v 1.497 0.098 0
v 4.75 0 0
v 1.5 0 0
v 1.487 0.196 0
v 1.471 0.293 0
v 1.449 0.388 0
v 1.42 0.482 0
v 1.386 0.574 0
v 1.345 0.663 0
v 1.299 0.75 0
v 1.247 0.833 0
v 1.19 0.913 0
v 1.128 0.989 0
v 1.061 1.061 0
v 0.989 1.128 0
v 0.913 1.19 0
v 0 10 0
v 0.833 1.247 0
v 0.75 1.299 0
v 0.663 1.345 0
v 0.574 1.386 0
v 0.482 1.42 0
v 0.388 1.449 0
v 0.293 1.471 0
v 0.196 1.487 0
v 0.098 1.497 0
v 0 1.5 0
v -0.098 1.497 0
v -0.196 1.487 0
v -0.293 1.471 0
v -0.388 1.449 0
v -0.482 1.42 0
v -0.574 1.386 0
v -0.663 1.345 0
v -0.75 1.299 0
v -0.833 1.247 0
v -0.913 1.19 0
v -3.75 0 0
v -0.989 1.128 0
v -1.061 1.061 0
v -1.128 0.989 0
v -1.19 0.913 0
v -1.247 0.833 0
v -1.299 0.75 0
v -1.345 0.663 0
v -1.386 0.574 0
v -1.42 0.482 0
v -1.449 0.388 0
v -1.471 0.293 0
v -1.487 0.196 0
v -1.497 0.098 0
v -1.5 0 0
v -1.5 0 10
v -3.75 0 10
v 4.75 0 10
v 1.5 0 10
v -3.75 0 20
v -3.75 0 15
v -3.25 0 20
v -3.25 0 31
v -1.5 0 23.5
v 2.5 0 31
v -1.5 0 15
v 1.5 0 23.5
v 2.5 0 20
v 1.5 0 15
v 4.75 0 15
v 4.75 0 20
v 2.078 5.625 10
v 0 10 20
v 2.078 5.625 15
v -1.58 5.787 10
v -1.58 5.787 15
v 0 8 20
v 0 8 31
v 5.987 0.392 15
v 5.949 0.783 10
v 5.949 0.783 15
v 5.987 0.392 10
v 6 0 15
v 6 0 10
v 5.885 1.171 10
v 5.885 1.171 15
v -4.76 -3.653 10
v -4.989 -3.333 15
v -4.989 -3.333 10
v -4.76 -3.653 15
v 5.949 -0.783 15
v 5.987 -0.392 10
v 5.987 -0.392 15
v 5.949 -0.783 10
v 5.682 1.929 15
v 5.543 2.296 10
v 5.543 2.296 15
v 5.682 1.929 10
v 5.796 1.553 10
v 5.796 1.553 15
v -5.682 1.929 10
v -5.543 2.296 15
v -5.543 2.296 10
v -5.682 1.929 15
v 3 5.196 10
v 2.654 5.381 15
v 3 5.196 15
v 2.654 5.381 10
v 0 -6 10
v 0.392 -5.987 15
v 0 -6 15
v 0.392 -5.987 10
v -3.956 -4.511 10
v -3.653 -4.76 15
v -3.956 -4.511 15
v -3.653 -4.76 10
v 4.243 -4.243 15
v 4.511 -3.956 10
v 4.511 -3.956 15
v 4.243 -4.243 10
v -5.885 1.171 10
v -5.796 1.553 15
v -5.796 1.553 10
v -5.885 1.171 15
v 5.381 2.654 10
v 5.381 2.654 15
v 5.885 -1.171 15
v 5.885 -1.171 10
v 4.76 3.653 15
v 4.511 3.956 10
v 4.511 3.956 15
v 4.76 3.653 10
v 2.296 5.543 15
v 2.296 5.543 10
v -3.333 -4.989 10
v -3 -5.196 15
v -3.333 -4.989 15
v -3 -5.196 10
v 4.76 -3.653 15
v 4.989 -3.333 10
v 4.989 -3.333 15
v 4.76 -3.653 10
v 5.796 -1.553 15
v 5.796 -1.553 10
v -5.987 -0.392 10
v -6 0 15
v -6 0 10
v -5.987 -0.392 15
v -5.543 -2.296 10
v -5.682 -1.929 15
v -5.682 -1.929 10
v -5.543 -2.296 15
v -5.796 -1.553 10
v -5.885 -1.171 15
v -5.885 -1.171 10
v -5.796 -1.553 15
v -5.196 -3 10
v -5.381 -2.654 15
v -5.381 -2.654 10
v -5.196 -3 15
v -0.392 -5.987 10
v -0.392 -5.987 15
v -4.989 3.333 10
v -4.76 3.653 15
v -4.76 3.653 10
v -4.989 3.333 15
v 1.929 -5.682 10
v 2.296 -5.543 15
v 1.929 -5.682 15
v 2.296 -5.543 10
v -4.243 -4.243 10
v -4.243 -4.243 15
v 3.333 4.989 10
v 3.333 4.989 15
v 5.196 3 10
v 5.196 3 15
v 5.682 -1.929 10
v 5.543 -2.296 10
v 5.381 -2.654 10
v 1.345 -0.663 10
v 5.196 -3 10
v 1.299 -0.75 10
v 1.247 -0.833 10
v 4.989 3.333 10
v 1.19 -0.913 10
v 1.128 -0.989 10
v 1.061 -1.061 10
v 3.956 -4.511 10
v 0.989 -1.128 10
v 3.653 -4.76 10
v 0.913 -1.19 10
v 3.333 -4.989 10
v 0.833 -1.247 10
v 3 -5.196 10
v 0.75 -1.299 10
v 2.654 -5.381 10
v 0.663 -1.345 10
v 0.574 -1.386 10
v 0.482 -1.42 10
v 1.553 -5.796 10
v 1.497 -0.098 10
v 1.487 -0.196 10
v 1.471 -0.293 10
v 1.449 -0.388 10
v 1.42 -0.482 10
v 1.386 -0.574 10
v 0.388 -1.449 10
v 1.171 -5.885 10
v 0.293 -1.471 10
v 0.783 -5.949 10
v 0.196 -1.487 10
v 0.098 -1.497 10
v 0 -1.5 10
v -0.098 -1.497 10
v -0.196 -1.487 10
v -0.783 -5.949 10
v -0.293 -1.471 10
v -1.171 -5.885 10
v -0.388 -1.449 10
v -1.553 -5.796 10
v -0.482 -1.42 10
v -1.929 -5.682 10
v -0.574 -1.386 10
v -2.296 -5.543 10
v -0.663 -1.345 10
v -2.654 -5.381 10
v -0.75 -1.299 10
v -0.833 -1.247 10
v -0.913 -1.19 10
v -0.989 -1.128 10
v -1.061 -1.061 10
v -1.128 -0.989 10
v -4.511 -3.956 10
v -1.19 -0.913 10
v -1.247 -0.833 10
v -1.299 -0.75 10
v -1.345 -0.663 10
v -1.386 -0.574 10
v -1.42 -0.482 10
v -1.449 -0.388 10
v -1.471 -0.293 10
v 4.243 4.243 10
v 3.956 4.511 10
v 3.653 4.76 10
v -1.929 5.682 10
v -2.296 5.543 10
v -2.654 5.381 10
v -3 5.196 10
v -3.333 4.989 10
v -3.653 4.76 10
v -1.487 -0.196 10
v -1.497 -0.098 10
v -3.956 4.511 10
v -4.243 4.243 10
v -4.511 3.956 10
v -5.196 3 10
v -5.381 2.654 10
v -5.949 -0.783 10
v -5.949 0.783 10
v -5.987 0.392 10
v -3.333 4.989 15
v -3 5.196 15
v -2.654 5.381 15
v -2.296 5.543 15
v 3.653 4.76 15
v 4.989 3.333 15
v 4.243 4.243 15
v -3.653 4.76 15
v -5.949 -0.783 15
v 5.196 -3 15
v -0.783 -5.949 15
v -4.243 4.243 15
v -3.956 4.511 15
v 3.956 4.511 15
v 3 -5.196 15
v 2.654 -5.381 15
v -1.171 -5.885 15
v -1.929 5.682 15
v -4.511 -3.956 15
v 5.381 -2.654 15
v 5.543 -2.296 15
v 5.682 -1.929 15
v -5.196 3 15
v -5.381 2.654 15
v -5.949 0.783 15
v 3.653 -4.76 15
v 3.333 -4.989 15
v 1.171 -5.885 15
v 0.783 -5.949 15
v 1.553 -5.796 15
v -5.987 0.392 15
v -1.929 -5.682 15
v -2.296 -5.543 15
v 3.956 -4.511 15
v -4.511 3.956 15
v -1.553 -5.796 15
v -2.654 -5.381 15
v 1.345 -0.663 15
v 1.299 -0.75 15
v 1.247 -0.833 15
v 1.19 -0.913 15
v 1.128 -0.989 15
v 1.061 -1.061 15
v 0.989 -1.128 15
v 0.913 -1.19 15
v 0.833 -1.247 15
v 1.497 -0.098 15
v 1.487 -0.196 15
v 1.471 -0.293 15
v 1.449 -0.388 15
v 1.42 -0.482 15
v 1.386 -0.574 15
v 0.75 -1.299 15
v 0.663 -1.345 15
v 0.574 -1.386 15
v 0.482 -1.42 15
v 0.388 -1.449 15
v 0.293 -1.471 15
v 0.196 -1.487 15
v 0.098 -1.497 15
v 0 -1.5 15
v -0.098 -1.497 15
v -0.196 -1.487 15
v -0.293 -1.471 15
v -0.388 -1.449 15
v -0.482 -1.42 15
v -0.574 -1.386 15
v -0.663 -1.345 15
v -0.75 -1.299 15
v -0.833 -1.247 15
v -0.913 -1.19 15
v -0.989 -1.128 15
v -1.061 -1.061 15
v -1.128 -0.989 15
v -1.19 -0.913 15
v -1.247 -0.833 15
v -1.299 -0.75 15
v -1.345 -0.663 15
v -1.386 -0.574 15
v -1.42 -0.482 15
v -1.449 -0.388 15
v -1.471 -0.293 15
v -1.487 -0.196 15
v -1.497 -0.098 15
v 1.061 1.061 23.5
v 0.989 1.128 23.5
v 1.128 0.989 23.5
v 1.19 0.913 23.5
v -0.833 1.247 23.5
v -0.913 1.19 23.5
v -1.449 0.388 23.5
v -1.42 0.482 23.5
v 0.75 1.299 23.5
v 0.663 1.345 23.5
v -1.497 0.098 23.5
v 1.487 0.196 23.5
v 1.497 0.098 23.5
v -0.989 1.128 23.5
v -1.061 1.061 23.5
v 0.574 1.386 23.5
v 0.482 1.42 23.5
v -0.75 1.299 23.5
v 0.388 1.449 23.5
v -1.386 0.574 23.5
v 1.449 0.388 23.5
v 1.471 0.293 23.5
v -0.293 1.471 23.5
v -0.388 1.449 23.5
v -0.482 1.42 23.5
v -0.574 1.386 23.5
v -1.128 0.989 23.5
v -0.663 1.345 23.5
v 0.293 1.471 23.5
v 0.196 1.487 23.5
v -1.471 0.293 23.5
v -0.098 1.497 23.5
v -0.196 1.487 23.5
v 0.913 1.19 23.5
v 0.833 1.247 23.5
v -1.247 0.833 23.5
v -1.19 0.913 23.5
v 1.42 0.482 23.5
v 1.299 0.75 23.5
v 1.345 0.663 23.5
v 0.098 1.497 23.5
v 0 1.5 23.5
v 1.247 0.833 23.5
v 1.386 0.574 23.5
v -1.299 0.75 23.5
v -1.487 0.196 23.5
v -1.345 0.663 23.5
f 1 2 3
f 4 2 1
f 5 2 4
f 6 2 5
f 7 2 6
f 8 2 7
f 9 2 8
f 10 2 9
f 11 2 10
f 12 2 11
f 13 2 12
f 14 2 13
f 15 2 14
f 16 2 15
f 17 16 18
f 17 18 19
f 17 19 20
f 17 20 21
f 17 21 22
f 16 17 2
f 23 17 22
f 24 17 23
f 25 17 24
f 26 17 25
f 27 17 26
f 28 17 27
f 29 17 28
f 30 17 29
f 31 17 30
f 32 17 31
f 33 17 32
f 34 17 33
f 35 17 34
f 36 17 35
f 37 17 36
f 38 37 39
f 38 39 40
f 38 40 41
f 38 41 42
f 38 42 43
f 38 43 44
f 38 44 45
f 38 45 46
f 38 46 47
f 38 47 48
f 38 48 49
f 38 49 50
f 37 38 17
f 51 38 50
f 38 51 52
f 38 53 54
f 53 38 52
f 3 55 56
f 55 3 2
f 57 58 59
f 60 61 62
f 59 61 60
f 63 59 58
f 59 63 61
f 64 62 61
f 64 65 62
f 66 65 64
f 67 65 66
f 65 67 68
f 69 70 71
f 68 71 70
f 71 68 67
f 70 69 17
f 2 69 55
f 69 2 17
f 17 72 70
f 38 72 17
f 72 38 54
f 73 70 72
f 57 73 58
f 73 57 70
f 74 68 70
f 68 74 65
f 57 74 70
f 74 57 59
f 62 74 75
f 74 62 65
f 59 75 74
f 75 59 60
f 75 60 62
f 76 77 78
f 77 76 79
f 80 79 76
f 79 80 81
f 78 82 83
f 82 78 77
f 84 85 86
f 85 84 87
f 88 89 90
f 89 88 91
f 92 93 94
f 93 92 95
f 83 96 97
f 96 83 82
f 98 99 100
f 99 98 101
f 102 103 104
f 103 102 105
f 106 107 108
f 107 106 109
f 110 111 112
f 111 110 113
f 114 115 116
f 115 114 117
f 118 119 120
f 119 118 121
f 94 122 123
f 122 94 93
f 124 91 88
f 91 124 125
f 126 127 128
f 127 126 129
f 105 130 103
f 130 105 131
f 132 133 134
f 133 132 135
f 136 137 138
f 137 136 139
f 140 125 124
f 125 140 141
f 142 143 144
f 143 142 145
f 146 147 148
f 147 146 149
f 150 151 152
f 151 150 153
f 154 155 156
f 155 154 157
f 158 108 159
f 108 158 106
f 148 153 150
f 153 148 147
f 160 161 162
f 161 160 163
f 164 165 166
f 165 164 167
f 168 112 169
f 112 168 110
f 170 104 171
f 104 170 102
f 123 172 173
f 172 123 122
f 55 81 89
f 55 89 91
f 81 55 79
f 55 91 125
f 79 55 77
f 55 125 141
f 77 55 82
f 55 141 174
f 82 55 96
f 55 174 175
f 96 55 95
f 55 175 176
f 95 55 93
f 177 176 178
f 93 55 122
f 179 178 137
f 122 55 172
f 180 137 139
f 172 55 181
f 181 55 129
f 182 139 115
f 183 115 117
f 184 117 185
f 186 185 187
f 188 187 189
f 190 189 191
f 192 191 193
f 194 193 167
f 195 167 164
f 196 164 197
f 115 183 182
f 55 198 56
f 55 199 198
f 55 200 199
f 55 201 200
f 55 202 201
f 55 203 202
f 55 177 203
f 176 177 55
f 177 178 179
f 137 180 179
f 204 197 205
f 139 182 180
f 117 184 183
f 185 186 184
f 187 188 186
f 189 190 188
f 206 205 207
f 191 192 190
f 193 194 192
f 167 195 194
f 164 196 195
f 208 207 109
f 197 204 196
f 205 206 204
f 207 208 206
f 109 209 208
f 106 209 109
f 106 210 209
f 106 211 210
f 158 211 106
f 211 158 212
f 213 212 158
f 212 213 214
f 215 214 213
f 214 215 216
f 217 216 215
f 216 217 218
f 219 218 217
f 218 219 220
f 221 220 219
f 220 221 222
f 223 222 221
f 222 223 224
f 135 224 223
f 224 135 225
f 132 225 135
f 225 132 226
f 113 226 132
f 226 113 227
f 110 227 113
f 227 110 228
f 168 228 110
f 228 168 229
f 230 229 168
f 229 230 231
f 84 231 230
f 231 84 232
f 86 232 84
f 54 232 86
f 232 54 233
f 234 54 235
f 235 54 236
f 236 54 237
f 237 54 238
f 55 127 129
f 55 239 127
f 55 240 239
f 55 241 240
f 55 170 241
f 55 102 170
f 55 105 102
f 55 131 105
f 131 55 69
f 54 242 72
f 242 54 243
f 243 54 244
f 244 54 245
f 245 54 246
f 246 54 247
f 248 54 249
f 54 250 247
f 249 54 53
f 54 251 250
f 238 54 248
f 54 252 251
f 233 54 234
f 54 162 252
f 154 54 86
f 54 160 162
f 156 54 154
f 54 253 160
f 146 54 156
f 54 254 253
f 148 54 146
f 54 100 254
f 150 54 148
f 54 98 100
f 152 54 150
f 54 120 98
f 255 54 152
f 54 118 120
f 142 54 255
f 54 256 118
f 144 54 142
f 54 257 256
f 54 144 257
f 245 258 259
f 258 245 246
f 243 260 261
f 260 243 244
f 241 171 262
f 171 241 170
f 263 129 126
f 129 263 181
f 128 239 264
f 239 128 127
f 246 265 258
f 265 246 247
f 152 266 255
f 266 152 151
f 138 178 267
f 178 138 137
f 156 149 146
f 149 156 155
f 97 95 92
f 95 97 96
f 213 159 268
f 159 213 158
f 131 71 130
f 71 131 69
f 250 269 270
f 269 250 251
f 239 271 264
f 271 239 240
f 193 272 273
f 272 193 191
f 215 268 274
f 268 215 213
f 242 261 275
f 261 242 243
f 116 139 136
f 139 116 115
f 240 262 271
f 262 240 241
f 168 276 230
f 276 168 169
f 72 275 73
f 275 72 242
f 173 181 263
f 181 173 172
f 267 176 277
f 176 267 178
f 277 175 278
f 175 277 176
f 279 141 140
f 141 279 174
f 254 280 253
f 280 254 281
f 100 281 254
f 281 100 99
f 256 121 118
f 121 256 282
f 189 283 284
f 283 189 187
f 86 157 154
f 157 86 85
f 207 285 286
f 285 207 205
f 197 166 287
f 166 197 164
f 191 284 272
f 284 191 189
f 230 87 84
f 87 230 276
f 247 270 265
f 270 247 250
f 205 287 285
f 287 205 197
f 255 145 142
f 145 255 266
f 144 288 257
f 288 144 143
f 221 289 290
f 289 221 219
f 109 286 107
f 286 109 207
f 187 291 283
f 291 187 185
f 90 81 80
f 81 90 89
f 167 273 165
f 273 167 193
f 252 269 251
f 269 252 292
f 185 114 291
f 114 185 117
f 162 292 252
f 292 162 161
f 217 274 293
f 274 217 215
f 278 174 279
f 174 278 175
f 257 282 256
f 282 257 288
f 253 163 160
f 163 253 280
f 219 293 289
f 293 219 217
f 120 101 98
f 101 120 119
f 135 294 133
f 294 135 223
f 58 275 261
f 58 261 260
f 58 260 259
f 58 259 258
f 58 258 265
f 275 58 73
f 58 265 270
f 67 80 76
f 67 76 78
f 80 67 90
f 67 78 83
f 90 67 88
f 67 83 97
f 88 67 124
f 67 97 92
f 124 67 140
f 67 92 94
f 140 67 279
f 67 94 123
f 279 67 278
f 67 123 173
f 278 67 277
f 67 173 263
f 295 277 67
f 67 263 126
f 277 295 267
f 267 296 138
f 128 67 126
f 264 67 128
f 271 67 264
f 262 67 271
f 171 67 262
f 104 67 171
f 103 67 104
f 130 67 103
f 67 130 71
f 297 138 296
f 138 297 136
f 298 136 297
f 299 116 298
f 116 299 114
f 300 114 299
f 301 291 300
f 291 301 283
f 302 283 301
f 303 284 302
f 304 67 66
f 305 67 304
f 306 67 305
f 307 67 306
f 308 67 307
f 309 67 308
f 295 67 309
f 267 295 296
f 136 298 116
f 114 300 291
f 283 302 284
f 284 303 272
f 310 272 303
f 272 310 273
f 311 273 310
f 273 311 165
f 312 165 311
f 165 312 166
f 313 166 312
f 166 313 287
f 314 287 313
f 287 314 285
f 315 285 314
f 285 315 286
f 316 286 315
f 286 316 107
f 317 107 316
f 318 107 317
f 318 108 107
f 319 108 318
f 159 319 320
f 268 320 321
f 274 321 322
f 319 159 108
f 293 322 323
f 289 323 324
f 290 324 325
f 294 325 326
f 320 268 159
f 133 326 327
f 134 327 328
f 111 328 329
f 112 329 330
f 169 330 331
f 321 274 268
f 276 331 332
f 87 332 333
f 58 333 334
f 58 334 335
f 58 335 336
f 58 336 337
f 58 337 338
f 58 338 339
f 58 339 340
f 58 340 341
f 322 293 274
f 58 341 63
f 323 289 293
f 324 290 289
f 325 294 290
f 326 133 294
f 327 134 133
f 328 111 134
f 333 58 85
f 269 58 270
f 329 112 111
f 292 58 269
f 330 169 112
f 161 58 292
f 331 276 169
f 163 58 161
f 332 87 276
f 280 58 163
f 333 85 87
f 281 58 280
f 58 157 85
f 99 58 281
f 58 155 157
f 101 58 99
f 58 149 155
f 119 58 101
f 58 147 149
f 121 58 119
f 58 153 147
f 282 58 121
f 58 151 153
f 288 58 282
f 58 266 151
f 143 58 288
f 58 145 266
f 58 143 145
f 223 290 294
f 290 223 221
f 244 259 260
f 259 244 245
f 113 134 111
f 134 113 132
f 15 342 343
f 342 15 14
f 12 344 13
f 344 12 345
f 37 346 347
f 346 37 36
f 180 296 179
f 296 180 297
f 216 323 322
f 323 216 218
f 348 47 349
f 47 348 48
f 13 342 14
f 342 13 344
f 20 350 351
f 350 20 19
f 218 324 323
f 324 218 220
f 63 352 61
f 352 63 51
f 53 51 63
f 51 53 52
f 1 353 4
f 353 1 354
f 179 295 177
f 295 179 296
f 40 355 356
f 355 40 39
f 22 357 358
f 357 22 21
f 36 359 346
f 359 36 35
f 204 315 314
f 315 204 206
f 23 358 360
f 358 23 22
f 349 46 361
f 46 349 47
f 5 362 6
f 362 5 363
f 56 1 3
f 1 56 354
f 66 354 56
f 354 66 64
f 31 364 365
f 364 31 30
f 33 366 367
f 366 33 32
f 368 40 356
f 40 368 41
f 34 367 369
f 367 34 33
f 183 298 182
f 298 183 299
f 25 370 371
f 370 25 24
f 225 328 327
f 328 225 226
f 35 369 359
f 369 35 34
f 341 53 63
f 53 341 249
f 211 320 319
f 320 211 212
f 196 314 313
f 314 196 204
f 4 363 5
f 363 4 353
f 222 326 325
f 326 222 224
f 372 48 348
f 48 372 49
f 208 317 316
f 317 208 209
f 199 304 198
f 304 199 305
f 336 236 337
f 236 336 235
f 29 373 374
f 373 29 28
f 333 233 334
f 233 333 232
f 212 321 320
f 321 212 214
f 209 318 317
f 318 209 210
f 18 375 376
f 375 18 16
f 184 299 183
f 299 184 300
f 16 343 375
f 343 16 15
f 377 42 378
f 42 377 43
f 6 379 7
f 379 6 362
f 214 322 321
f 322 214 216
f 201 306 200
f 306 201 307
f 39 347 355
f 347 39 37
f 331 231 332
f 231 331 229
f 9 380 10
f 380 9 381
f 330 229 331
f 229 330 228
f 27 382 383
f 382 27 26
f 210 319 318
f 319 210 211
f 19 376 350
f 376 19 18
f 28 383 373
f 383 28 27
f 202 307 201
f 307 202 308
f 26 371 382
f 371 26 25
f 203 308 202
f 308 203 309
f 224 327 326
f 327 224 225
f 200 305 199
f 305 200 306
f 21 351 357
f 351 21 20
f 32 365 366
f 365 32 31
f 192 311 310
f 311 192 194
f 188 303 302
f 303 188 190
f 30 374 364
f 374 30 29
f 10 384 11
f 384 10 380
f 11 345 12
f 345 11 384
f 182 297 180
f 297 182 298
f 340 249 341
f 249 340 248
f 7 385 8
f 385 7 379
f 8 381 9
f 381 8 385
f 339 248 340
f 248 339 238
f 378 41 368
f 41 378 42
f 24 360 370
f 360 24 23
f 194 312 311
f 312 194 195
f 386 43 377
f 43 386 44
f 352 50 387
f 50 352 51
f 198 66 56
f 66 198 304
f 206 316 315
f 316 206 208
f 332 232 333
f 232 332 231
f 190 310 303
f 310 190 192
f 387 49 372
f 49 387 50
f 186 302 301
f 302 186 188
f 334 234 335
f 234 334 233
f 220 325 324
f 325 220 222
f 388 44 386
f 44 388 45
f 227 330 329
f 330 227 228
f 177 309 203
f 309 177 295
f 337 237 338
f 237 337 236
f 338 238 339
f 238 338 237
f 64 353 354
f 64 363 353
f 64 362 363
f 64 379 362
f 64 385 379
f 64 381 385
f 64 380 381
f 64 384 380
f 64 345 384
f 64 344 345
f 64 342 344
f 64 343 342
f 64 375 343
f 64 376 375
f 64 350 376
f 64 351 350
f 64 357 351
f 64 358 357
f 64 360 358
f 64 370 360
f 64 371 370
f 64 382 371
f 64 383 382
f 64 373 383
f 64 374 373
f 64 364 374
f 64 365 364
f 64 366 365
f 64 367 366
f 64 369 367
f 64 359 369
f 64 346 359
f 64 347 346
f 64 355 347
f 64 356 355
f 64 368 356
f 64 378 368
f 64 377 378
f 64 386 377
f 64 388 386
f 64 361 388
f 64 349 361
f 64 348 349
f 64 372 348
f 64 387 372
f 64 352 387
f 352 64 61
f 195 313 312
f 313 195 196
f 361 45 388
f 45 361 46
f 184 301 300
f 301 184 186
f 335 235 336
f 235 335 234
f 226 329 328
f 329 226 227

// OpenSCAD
// Hose-barb reducer: 8 mm tubing (barbs A) -> collar -> 5 mm tubing (barbs B)
// Print orientation: standing upright along Z, centred on origin in X/Y

$fn = 96;

// ---- Dimensions (mm) ----
bore      = 3;    // through-bore diameter
barb_a_h  = 10;   // height of each 8 mm barb
barb_a_d  = 7.5;  // outer diameter of 8 mm barb (bottom)
barb_a_dt = 9.5;  // outer diameter of 8 mm barb (top)
collar_d  = 12;   // collar diameter
collar_h  = 5;    // collar height (z = 20 to 25)
barb_b_h  = 8;    // height of each 5 mm barb
barb_b_d  = 6.5;  // outer diameter of 5 mm barb (bottom)
barb_b_dt = 5.0;  // outer diameter of 5 mm barb (top)
eps       = 0.5;  // overcut for clean differences

// ---- Derived ----
z0 = 0;           // start of barbs A
z2 = z0 + barb_a_h; // bottom of collar (top of barbs A)
z5 = z2 + collar_h; // top of collar (bottom of barbs B)
zn = z5 + barb_b_h; // end of barbs B

// ---- Model ----
difference() {
    union() {
        // Barbs for 8 mm tubing
        for (i = [0 : 1])
            translate([0, 0, z0 + i * barb_a_h])
                linear_extrude(height = barb_a_h)
                    polygon([
                        [-barb_a_d / 2, 0],
                        [ barb_a_dt / 2, 0],
                        [ 0, barb_a_h]
                    ]);

        // Collar
        translate([0, 0, z2])
            cylinder(d = collar_d, h = collar_h);

        // Barbs for 5 mm tubing
        for (i = [0 : 1])
            translate([0, 0, z5 + i * barb_b_h])
                linear_extrude(height = barb_b_h)
                    polygon([
                        [-barb_b_d / 2, 0],
                        [ barb_b_dt / 2, 0],
                        [ 0, barb_b_h]
                    ]);
    }

    // Through-bore
    translate([0, 0, z0 - eps])
        cylinder(d = bore, h = zn + 2 * eps);
}
